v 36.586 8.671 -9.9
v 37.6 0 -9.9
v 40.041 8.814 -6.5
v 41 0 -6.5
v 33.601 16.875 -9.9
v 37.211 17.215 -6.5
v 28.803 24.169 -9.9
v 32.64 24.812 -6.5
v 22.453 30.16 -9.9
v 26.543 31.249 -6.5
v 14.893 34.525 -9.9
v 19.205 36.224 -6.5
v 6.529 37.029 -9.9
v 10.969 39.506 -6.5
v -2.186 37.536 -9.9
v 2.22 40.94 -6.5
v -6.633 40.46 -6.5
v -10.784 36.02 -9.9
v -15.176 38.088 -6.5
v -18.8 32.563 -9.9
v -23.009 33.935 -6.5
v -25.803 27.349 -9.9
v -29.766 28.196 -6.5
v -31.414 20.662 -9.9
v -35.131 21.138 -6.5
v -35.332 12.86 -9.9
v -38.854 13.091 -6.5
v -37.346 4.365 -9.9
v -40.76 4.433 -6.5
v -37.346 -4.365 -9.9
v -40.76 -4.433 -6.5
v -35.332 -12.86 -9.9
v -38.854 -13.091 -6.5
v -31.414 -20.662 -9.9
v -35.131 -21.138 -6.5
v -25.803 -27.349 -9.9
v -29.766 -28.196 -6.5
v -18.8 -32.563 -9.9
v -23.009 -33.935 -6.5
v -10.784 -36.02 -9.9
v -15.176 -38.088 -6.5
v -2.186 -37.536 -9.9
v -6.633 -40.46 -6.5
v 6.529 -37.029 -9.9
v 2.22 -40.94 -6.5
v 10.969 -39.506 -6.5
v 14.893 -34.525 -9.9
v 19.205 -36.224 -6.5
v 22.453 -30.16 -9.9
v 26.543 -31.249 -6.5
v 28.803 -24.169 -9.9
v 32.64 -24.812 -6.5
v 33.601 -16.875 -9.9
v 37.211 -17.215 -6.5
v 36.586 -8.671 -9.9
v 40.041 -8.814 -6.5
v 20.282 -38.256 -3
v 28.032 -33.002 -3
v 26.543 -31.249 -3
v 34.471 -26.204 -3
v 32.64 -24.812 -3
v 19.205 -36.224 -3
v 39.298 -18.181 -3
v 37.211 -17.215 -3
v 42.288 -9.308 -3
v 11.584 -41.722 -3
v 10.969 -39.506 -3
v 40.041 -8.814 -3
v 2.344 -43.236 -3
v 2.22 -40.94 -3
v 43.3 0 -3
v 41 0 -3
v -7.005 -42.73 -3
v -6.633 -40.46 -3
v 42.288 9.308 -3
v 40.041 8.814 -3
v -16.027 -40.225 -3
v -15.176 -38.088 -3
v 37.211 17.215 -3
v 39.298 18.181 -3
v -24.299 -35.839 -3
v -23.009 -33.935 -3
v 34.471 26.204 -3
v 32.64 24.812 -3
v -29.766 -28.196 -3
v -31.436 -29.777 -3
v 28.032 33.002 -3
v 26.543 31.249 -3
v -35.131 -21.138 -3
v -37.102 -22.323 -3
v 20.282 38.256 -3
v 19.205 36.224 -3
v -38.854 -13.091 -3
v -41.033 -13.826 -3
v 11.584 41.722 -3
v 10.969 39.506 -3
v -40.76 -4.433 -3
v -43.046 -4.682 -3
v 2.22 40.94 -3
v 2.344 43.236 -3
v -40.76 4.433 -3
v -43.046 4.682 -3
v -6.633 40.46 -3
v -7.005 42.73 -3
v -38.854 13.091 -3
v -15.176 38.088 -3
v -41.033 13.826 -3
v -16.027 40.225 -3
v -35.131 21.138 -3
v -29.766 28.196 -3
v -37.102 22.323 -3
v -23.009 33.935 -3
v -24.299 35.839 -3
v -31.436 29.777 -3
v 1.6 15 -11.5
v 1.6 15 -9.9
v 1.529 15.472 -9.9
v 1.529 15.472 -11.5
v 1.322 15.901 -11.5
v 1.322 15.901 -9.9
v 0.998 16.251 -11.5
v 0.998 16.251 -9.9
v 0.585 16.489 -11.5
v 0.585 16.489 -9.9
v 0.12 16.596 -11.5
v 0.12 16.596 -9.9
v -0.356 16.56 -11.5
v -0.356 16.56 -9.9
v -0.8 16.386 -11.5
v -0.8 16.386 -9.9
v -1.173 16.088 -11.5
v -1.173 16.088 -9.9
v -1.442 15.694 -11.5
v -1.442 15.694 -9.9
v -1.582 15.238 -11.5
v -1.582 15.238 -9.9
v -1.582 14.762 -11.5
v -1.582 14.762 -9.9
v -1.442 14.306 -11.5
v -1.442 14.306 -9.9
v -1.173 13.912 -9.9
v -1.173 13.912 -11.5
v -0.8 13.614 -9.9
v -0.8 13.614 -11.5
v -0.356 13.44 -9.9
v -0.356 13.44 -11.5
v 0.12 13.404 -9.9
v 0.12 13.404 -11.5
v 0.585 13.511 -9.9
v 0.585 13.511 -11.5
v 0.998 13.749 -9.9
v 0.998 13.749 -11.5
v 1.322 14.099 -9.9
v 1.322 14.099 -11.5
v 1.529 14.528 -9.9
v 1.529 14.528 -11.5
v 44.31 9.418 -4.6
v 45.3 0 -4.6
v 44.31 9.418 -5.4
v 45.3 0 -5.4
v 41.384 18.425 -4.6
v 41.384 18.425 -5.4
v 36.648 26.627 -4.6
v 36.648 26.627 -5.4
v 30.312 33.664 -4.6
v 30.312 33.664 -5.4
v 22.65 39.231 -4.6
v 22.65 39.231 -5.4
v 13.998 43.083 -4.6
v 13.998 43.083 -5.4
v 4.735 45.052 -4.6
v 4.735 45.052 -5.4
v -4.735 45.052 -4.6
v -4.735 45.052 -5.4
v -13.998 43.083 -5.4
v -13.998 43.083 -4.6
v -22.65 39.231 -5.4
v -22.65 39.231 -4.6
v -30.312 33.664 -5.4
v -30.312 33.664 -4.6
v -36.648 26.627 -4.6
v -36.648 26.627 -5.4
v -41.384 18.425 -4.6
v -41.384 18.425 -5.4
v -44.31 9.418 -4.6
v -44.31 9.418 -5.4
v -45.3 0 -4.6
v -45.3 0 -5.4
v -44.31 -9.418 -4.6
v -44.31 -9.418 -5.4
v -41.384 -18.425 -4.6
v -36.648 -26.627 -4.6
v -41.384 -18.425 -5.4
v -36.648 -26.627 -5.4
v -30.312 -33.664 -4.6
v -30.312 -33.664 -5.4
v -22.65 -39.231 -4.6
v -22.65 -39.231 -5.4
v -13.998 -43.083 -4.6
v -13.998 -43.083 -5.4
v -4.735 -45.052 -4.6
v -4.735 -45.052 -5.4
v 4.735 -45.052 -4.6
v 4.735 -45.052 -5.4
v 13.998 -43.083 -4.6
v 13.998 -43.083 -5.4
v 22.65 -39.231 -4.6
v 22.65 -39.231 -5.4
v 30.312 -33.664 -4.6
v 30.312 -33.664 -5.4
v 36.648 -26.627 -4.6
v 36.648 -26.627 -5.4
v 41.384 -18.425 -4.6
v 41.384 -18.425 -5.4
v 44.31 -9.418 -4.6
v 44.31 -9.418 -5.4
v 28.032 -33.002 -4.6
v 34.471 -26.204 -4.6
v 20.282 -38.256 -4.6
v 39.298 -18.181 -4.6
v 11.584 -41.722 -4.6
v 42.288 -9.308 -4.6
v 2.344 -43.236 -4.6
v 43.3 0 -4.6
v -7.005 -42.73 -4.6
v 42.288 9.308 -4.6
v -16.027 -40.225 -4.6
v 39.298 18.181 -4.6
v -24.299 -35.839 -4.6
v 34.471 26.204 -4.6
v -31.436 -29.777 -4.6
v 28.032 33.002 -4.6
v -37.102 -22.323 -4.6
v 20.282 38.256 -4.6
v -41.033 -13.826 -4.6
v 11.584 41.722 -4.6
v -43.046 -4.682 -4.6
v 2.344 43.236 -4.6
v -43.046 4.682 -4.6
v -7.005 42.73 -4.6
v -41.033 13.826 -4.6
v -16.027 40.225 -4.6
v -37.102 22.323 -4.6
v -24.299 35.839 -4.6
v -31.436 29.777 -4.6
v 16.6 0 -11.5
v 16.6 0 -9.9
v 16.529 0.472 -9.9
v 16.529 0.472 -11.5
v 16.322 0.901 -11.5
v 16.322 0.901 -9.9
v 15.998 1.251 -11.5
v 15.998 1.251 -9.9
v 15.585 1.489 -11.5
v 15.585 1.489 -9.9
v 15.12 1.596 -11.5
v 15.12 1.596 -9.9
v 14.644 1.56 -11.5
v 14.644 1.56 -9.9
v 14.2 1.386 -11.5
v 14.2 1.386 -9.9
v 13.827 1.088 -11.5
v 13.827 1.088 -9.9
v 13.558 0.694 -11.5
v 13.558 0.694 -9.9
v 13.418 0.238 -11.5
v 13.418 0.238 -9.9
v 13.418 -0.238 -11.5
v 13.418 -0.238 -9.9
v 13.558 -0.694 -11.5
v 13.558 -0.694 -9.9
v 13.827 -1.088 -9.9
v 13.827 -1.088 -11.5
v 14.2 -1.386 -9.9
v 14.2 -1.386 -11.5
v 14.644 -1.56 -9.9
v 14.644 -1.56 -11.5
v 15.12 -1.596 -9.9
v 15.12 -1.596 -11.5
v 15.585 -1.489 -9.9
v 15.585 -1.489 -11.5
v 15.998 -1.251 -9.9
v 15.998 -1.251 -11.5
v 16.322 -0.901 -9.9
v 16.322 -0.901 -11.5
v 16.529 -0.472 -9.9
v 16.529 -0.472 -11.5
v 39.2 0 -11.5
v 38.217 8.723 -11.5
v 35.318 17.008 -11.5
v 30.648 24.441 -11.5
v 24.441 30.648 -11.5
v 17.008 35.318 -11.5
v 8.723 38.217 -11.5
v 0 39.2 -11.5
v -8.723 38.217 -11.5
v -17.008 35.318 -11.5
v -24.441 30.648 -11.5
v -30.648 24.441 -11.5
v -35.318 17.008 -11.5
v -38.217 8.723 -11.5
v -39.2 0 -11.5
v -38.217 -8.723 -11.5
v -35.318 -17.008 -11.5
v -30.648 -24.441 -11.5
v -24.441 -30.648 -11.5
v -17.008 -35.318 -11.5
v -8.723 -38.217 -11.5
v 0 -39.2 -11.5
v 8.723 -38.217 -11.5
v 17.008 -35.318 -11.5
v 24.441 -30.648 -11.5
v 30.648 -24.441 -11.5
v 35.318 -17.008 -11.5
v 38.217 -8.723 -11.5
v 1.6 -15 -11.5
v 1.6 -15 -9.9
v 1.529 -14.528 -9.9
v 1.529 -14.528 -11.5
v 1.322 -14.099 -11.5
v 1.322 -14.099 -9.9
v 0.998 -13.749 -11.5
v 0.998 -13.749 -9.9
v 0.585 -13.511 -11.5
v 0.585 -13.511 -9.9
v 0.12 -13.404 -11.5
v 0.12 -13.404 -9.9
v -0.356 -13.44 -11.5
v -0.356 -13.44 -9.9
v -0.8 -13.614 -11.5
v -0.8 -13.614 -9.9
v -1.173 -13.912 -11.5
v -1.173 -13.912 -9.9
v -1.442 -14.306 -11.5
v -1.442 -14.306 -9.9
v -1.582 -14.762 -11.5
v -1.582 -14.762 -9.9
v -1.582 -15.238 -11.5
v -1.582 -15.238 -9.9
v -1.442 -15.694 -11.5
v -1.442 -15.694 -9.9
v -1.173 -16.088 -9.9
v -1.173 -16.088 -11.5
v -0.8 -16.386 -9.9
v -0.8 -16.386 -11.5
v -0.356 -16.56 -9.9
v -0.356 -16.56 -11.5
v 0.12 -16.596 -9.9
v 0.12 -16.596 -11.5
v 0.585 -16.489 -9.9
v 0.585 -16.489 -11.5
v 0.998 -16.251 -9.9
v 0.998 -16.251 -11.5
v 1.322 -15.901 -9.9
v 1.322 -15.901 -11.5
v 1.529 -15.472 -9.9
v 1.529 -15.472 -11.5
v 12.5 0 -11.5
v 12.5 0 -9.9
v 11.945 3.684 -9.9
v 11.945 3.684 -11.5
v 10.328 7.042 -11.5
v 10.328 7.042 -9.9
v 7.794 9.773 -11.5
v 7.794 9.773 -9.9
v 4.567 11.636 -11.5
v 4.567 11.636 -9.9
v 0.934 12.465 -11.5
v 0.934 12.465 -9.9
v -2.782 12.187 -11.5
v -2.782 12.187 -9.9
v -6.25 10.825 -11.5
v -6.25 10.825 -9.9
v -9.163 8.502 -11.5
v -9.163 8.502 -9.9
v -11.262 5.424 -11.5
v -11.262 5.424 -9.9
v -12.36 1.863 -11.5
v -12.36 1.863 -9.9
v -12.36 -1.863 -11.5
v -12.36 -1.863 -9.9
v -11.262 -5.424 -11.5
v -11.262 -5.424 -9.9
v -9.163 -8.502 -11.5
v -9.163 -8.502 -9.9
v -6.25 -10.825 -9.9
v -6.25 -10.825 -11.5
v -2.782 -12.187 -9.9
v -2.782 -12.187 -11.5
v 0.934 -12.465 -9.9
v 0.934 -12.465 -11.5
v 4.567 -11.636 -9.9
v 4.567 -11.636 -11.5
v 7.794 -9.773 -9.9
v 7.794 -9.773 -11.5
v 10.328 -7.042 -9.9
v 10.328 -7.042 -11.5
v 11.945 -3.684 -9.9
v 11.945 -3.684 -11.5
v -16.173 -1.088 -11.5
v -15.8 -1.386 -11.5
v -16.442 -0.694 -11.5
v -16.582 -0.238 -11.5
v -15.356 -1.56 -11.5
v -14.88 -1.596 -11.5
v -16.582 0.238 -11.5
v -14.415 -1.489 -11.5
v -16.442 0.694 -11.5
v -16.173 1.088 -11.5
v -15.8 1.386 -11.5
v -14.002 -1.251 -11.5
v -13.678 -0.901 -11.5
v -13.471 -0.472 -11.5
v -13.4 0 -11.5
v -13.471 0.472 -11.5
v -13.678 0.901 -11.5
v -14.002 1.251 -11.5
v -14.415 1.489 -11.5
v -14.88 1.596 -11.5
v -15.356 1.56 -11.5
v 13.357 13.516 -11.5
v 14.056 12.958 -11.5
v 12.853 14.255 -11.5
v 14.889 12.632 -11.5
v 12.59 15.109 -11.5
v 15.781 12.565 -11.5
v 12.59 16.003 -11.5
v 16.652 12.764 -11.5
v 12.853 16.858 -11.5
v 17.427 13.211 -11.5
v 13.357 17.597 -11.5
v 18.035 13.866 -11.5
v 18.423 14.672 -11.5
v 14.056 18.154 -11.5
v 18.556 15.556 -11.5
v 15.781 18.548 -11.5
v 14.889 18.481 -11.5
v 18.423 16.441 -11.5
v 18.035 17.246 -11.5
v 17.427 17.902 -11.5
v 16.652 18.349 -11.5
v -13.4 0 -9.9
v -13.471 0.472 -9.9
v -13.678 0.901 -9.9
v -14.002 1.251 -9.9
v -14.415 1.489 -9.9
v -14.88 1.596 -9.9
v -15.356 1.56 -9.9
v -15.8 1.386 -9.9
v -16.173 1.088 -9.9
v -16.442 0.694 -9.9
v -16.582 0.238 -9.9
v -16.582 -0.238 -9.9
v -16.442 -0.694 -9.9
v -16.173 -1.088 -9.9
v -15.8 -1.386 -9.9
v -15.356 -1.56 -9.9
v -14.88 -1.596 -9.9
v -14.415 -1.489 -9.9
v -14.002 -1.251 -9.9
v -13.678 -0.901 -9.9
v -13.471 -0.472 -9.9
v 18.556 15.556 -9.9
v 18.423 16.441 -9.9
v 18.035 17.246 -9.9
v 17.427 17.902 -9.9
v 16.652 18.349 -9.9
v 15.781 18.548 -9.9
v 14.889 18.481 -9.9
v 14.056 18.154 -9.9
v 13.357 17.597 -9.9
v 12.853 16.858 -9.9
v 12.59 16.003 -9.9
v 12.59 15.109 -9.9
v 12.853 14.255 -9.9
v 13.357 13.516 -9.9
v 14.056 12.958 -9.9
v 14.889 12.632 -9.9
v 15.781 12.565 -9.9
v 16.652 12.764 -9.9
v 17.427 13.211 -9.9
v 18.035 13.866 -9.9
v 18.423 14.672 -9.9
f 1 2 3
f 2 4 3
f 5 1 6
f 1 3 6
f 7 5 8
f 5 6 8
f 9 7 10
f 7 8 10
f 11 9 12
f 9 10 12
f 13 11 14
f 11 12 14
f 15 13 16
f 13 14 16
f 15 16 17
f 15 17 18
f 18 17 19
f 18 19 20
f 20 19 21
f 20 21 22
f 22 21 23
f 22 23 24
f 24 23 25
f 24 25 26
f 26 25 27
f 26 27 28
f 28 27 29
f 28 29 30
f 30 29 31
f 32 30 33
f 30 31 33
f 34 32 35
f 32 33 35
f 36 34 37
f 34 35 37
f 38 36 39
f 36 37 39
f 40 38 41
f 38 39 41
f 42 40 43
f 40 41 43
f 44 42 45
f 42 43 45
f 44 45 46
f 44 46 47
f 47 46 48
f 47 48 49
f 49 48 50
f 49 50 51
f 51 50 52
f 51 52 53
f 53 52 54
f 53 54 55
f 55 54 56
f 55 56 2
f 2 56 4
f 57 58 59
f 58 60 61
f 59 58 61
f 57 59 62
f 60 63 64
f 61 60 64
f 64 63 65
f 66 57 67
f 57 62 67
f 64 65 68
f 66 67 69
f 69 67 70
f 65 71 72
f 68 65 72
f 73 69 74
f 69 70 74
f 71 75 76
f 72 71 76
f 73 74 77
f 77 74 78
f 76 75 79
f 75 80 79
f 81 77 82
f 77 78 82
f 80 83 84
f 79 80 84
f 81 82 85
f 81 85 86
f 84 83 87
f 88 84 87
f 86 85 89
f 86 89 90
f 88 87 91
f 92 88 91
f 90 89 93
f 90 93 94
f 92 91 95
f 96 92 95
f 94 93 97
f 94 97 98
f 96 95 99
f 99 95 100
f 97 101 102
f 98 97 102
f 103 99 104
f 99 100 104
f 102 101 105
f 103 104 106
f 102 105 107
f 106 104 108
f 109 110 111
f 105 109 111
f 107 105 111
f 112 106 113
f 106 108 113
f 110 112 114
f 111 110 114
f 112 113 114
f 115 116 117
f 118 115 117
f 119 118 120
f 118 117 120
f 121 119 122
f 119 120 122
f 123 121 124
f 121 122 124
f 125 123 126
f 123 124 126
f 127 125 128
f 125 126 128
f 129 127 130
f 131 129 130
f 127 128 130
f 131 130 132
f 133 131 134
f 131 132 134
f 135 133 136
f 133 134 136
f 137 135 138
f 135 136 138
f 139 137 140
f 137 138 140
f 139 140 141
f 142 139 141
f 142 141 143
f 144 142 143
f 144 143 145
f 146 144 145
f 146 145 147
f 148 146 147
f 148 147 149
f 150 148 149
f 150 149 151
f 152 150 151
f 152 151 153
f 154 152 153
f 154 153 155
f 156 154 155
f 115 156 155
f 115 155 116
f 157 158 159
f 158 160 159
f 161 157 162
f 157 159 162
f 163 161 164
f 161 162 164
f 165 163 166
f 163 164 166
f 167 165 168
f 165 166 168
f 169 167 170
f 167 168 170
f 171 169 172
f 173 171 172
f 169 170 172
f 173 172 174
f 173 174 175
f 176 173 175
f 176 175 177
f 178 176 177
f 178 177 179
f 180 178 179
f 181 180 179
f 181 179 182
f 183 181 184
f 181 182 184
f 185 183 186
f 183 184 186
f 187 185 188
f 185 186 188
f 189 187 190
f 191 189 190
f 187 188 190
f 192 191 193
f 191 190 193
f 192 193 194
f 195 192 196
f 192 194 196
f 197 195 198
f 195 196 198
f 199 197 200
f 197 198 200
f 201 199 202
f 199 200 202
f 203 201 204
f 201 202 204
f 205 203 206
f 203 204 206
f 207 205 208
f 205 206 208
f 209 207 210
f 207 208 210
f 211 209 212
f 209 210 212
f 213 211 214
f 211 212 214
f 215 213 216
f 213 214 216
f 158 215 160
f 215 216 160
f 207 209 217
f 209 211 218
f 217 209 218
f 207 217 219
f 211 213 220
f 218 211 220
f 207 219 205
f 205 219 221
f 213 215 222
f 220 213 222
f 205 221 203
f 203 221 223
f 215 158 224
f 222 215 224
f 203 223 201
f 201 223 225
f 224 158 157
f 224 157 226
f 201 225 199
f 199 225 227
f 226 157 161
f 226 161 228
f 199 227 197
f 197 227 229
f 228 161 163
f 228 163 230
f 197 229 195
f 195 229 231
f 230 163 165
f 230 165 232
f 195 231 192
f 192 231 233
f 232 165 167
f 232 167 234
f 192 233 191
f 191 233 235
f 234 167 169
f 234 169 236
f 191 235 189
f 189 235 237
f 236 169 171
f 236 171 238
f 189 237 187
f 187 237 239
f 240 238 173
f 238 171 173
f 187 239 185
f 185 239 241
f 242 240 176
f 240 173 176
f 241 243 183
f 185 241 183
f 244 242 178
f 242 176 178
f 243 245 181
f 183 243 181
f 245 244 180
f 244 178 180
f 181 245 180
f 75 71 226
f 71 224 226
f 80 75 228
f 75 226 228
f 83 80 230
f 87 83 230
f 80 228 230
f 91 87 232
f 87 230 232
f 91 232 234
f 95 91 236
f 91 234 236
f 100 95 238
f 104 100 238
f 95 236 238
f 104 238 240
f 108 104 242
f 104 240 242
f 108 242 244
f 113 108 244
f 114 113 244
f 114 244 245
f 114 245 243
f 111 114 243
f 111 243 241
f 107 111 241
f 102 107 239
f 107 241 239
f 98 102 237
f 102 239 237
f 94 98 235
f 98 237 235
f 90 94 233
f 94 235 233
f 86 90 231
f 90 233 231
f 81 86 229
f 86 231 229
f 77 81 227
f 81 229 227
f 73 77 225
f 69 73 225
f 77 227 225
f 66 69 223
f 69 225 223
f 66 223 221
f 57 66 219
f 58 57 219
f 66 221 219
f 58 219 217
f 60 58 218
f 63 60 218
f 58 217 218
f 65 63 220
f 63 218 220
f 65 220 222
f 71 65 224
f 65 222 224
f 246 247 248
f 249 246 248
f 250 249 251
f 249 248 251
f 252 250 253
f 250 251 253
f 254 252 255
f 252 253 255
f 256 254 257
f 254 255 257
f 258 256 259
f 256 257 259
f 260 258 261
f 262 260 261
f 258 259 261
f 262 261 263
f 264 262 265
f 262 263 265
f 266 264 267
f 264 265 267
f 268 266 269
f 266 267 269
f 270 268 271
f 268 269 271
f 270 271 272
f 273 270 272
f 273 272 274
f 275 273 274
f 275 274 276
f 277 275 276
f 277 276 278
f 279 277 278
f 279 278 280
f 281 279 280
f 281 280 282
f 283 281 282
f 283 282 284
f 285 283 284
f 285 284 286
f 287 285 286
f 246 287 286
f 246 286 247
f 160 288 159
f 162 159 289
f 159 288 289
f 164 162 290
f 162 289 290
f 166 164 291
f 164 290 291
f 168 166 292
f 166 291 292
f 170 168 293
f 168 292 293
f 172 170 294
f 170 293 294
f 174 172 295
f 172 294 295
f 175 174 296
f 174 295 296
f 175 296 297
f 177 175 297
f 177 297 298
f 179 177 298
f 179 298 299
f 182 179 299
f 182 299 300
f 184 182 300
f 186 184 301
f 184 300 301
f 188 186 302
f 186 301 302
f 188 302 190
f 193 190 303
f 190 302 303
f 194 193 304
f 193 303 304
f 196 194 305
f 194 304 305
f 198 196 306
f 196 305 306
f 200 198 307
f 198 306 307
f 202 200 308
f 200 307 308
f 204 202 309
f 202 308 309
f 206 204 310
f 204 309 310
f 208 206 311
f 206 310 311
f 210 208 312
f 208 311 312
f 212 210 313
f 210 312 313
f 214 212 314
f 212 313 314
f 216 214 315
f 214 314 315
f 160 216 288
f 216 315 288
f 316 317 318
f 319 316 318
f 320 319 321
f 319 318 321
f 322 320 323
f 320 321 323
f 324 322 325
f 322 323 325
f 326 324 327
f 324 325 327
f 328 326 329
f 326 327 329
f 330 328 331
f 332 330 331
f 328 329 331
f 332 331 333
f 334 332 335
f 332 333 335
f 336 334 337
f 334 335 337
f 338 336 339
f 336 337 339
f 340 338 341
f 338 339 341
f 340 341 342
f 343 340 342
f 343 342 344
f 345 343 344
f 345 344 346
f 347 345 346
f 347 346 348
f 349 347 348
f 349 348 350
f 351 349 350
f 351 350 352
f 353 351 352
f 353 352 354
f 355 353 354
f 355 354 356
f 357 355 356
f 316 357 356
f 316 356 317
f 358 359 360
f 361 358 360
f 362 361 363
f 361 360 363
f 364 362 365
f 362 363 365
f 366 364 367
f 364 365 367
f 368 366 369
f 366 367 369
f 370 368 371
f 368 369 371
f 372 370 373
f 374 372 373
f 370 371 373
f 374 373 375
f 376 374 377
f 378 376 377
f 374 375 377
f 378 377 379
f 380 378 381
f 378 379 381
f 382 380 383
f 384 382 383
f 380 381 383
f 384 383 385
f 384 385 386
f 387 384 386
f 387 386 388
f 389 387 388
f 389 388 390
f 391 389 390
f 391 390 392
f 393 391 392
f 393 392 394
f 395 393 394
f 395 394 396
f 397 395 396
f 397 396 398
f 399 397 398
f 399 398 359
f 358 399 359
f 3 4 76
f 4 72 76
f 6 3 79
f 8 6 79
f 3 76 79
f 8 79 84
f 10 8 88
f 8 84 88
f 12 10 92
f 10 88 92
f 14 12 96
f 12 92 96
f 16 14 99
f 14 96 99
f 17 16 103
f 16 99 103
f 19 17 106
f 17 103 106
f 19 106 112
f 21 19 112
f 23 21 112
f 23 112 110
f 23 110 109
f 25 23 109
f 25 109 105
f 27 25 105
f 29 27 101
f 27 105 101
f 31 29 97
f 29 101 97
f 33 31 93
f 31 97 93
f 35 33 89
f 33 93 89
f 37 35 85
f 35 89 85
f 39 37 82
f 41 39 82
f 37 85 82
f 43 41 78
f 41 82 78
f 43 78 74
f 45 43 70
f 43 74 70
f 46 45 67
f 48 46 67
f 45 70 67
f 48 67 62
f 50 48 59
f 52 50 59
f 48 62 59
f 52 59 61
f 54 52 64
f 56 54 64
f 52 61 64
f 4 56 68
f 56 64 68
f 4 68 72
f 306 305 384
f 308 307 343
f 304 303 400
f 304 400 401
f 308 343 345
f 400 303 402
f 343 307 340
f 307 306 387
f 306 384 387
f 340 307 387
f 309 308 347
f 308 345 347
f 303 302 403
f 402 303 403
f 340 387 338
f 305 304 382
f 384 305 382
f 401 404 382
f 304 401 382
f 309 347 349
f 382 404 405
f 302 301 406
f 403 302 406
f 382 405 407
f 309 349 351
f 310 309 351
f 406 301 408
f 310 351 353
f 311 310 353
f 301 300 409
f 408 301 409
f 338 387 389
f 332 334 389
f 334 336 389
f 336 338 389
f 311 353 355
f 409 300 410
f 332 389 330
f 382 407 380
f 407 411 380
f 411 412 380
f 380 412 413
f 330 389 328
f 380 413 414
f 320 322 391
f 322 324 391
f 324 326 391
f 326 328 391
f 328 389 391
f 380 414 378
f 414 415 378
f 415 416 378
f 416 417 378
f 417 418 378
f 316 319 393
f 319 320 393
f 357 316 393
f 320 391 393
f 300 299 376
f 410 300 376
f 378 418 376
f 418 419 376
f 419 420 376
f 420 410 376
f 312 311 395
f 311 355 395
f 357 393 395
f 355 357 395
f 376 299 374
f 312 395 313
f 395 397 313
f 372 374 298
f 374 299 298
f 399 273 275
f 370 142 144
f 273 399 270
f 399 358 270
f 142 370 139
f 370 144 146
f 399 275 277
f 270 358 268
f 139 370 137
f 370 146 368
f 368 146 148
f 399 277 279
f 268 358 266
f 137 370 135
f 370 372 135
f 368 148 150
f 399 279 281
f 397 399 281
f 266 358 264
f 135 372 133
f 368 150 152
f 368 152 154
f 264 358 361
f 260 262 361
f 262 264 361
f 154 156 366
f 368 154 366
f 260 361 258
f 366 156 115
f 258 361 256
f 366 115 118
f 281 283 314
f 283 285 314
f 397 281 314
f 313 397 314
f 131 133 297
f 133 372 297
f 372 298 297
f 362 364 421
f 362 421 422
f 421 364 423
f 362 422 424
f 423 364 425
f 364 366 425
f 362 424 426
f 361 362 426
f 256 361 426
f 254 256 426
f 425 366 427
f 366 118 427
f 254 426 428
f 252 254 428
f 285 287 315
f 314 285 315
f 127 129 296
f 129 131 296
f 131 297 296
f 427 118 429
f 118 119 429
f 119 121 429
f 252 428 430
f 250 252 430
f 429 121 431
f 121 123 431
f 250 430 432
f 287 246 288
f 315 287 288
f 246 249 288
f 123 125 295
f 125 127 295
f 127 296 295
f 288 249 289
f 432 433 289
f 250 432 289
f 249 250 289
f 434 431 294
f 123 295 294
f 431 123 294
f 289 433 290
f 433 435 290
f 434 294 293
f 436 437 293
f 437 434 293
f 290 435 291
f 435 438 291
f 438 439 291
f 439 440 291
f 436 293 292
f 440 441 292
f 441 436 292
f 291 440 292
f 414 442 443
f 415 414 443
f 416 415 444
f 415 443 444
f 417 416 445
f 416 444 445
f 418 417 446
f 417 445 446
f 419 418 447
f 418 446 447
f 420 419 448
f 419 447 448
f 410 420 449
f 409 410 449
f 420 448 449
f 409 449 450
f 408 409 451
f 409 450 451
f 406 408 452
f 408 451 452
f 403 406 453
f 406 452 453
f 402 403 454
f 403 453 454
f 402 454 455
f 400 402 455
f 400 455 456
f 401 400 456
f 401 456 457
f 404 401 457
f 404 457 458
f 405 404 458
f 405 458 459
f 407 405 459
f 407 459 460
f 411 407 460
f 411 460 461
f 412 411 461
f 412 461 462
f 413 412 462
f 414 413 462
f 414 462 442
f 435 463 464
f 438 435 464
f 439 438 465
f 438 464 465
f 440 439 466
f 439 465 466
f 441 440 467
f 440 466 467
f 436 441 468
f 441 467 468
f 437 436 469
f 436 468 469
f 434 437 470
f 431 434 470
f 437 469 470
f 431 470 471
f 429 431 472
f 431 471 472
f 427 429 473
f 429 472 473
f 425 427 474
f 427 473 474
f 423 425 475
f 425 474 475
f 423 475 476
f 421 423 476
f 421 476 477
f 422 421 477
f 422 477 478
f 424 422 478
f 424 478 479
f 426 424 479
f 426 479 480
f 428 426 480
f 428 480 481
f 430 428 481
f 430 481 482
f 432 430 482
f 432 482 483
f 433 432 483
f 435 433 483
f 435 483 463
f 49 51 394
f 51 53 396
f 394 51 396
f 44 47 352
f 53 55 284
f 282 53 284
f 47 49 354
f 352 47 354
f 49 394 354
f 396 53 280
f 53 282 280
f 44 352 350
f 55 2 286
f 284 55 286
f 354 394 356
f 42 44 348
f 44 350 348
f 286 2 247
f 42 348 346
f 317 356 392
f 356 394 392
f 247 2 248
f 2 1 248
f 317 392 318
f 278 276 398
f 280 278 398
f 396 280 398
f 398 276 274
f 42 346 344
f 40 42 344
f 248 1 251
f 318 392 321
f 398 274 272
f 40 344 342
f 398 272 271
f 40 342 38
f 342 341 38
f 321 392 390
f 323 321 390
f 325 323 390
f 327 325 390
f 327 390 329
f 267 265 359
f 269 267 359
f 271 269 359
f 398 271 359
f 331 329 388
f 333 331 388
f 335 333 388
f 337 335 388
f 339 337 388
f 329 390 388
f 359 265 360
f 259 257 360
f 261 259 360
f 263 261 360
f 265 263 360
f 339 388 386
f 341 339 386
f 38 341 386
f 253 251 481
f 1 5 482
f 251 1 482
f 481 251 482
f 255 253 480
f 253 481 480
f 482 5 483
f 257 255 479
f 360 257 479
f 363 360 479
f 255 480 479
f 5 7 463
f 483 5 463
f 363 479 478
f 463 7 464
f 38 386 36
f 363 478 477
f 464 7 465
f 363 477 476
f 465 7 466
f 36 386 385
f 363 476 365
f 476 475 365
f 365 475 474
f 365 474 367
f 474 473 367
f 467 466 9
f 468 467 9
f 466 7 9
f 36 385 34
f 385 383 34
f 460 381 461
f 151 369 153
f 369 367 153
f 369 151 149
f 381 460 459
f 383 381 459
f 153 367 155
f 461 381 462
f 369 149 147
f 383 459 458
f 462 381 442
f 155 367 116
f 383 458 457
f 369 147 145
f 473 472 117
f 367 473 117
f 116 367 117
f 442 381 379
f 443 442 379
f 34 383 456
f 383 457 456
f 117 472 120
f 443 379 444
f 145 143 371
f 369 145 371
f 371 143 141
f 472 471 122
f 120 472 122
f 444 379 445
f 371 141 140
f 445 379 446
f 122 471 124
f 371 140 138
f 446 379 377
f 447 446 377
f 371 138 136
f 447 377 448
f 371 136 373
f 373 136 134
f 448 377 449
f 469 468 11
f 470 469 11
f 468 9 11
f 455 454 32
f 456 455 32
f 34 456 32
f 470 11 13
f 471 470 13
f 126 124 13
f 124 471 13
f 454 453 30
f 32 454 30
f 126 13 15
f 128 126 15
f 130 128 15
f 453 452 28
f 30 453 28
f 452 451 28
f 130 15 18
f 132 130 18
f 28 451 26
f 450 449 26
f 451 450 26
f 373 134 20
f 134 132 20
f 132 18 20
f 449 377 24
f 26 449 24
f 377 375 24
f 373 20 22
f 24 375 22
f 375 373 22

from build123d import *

# Parameters (mm, degrees)
SKETCH040_R      = 1.6
SKETCH040_R_2    = 12.5
SKETCH040_R_3    = 3
EXTRUDE004_DEPTH = 10


with BuildPart() as extrude004:
    # Sketch040 → Extrude004 (new body)
    with BuildSketch(Plane.XY.offset(-9.9)):
        with Locations((0, 15)):
            Circle(SKETCH040_R)
        with Locations((0, -15)):
            Circle(SKETCH040_R)
        with Locations((-15, 0)):
            Circle(SKETCH040_R)
        with Locations((15, 0)):
            Circle(SKETCH040_R)
        Circle(SKETCH040_R_2)
        with Locations((15.556349, 15.556349)):
            Circle(SKETCH040_R_3)
    extrude(amount=-EXTRUDE004_DEPTH)


with BuildPart() as cut:
    # Sketch039 → Revolve (revolve)
    with BuildSketch(Plane.XZ):
        Polygon((41, -6.5), (41, -3), (43.3, -3), (43.3, -4.6), (45.3, -4.6), (45.3, -5.4), (39.2, -11.5), (0, -11.5), (0, -9.9), (37.6, -9.9), align=None)
    revolve(axis=Axis((0, 0, 0), (0, 0, 1)))

    # Cut: cut Extrude004
    add(extrude004.part, mode=Mode.SUBTRACT)


solid = cut.part
